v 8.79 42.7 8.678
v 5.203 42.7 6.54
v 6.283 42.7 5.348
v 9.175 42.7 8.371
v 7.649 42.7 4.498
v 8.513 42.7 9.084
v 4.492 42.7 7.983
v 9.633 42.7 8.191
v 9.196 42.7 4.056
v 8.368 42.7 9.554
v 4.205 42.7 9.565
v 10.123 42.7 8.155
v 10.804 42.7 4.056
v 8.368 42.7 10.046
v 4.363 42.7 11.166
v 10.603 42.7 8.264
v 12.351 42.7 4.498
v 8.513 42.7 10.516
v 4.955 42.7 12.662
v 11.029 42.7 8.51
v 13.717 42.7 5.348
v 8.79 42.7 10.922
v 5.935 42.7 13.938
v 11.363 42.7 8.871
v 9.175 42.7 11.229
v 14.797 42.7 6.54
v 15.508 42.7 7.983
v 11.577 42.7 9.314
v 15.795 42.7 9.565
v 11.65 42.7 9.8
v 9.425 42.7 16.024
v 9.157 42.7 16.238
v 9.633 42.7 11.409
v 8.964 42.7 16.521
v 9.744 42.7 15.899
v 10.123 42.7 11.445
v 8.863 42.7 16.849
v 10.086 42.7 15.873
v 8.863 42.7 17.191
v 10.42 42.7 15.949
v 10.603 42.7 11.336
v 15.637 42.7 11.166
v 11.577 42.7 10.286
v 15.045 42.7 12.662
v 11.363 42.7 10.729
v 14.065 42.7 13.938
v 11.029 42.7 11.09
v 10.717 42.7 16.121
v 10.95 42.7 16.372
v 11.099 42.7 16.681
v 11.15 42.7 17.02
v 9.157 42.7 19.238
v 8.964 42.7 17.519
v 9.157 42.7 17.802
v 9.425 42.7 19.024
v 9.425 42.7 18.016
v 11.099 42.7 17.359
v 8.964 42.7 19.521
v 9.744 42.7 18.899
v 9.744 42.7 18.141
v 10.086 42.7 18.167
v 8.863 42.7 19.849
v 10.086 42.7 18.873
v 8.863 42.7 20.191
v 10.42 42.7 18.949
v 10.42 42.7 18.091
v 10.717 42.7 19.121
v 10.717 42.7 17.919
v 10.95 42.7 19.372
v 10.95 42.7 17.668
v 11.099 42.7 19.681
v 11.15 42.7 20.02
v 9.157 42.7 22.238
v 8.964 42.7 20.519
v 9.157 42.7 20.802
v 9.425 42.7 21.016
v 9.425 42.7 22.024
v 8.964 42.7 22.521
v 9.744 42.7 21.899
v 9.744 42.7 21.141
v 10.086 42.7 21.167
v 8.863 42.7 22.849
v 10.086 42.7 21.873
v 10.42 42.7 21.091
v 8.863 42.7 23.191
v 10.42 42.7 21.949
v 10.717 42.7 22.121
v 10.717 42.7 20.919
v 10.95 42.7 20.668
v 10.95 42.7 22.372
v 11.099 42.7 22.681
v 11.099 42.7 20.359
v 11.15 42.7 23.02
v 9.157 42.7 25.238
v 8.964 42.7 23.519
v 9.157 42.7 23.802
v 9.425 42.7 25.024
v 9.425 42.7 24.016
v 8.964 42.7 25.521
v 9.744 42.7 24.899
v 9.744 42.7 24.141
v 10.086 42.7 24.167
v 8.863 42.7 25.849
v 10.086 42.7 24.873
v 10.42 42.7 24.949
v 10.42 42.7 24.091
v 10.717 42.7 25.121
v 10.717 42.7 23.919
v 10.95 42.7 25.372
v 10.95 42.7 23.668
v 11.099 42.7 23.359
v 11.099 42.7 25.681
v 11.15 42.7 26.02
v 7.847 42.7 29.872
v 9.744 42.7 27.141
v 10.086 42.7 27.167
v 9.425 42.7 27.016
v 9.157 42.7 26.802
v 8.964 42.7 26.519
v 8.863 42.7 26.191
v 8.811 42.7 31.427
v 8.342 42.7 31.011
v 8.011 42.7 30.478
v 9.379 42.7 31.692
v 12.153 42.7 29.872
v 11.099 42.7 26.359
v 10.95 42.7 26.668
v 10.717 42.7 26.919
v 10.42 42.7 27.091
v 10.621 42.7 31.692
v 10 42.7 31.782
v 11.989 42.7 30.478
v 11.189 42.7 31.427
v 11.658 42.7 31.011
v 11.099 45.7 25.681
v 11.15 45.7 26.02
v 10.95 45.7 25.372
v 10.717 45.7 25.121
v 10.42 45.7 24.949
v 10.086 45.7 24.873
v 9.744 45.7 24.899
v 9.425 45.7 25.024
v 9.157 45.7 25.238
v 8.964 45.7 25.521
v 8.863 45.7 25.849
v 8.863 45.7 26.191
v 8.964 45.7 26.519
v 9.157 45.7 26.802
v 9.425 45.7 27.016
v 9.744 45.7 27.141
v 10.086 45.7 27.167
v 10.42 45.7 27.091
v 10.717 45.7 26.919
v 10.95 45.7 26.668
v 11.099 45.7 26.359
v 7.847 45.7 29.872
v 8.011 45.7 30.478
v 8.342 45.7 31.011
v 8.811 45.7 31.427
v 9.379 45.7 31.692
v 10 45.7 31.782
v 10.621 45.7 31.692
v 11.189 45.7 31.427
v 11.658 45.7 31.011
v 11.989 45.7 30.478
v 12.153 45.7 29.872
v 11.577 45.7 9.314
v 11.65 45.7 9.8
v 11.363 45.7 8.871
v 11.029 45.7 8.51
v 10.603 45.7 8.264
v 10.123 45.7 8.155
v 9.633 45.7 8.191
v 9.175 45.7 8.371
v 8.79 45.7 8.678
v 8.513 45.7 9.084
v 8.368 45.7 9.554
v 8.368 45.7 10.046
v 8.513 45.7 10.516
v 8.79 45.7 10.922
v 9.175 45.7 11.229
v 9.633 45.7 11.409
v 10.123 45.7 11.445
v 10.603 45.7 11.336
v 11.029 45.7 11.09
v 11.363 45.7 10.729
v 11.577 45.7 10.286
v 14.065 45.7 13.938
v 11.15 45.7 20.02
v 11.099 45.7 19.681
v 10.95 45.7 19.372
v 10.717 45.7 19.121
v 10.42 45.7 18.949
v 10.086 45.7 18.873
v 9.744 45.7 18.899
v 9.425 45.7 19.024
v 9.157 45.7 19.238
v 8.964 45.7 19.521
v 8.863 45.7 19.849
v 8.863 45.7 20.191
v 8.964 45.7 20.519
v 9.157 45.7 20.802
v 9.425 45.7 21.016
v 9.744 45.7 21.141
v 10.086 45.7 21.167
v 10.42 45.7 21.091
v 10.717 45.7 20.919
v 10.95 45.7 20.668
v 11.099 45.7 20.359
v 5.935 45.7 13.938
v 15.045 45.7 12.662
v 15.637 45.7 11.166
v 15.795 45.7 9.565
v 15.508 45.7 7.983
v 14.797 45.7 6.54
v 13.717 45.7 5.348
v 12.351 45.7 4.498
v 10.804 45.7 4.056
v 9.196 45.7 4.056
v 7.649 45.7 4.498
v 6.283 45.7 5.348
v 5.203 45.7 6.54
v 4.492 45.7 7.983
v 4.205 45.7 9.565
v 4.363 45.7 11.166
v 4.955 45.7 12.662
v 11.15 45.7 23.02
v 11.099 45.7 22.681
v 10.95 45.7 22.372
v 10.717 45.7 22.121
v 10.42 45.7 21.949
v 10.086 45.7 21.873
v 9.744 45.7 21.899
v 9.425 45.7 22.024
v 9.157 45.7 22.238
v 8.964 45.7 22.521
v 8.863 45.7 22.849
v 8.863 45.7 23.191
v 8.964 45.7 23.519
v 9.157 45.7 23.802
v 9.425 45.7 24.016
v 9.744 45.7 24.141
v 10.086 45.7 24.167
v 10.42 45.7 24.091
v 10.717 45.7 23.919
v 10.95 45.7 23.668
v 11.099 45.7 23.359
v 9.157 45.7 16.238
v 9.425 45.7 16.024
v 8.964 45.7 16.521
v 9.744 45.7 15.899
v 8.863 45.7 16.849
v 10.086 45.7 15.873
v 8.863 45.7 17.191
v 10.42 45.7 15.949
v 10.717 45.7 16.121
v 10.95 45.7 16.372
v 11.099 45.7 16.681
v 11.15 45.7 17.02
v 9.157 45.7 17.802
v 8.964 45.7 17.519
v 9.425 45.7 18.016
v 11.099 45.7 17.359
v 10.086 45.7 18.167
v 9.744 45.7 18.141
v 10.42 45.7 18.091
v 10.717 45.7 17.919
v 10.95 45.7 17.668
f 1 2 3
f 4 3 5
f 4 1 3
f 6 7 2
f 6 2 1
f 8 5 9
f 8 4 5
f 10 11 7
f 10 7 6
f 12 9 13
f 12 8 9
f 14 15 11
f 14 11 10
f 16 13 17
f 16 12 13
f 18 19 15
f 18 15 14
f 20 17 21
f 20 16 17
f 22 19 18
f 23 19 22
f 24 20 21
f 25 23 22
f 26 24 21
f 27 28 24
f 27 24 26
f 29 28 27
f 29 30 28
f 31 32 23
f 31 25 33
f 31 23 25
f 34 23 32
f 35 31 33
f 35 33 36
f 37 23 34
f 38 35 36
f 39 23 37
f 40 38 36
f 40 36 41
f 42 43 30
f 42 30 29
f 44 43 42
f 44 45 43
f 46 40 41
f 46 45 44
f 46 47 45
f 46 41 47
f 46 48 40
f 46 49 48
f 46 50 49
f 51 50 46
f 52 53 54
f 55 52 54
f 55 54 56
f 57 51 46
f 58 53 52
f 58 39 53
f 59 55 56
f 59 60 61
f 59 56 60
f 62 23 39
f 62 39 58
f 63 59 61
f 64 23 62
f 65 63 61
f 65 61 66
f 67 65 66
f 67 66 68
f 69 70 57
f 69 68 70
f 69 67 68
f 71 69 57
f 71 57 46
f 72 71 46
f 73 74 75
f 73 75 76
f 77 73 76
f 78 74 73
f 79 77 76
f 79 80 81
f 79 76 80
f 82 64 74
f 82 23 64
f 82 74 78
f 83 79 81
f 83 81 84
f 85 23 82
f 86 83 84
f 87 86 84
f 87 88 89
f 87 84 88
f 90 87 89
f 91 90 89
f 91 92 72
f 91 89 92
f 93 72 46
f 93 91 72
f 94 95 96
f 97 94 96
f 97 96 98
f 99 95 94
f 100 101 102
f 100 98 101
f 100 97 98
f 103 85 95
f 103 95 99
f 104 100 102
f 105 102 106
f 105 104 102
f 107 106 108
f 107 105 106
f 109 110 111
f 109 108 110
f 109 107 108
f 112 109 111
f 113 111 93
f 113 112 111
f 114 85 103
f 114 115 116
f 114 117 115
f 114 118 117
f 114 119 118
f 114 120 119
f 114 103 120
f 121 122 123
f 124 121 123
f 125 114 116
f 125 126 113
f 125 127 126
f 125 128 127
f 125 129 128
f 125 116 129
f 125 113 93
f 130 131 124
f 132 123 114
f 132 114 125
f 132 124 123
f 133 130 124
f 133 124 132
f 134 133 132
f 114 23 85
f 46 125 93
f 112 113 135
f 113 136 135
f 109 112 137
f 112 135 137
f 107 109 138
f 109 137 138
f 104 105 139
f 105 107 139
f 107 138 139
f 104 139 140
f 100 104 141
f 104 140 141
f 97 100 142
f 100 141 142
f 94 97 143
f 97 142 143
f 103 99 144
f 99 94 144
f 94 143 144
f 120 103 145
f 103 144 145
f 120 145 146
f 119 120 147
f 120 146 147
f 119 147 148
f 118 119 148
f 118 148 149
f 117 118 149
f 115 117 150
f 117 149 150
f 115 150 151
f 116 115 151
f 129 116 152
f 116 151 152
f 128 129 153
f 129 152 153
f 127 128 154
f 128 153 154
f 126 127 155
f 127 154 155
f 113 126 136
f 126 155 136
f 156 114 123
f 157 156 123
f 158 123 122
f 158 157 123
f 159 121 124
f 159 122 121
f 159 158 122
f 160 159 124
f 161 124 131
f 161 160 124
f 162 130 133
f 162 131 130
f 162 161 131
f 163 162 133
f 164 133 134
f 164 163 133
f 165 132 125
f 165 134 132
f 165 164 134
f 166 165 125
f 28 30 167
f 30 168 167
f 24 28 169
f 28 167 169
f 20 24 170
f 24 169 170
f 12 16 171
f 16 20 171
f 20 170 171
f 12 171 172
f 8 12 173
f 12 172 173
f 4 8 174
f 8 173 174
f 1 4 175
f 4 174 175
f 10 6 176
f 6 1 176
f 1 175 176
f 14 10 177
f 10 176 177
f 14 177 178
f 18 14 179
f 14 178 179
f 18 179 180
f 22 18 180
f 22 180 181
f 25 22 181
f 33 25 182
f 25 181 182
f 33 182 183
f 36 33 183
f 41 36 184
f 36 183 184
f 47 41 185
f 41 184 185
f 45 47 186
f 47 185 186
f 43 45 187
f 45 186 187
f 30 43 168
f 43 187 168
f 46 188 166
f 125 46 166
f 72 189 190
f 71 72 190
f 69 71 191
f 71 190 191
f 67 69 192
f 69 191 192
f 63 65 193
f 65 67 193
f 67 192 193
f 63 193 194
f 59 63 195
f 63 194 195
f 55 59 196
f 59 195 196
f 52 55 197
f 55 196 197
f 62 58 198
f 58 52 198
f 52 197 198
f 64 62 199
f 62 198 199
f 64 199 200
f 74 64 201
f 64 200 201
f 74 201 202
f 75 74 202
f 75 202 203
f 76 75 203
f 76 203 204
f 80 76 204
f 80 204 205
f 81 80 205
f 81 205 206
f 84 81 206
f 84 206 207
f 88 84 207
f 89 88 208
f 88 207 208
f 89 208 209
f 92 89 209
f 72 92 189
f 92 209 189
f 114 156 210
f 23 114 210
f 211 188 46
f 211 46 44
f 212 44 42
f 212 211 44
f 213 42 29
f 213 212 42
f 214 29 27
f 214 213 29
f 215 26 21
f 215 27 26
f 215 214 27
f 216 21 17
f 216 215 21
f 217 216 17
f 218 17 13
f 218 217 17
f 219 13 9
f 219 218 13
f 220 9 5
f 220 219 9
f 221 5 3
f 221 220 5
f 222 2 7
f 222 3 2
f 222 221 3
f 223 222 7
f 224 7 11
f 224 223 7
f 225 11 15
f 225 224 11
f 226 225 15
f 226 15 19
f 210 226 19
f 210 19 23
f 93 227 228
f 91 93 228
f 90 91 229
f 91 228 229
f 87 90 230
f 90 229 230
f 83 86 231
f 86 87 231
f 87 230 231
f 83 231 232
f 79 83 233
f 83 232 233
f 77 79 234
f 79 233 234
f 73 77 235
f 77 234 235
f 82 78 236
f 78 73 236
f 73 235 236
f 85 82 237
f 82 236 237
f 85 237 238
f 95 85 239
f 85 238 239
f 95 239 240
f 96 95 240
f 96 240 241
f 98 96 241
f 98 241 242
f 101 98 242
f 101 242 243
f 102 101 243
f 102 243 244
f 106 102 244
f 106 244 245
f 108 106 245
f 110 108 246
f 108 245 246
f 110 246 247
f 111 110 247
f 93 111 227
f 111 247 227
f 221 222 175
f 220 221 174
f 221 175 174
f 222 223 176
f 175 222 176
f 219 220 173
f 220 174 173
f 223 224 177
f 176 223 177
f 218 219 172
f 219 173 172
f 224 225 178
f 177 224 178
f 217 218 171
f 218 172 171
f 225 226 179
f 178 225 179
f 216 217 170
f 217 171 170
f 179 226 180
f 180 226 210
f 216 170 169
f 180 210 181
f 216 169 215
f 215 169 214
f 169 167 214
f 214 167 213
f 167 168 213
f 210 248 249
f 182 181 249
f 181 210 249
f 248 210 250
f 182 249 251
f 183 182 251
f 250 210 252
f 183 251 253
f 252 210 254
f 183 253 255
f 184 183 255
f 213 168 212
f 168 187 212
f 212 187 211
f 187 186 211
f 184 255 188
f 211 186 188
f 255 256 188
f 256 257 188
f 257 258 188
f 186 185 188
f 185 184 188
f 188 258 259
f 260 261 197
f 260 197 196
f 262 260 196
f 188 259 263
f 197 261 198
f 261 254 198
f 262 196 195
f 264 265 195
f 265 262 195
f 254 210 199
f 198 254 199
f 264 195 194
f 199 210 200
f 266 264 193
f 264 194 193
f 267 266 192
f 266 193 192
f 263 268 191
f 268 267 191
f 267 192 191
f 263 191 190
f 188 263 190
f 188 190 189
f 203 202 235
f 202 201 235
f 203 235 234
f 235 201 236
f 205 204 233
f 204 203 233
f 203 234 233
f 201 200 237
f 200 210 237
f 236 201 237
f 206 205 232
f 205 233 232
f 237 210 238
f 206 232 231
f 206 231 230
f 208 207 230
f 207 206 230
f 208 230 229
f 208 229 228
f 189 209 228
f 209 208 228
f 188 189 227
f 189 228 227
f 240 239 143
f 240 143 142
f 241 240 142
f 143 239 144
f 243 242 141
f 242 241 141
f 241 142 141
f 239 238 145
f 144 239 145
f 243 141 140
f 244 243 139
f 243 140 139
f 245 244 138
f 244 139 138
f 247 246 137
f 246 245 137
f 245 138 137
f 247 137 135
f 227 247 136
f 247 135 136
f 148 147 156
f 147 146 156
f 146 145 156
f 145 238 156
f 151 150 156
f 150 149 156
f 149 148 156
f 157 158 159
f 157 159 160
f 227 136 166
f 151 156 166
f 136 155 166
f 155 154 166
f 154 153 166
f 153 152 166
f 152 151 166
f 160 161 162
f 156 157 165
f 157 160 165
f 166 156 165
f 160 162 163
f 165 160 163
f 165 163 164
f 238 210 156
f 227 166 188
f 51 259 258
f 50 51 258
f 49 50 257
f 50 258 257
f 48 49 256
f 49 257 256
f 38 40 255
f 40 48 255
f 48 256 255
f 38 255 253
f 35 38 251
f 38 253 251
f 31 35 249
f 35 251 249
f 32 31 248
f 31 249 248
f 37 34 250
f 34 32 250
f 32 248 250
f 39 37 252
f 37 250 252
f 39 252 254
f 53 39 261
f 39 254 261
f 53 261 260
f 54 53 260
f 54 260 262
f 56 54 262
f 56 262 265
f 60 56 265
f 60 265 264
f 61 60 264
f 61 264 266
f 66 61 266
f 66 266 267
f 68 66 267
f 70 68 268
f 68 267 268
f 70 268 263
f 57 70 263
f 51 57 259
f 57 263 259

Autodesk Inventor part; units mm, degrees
ref_plane "YZ Plane" through (0, 0, 0) normal (1, 0, 0) x (0, 1, 0)
ref_plane "XZ Plane" through (0, 0, 0) normal (0, 1, 0) x (-1, 0, 0)
ref_plane "XY Plane" through (0, 0, 0) normal (0, 0, 1) x (1, 0, 0)
ref_plane "Work Plane12" through (10, 45.7, 9.8) normal (0, -1, 0) x (1, 0, 0)
sketch "Sketch20" plane through (10, 45.7, 9.8) normal (0, -1, 0) x (1, 0, 0)
  circle A0 centre (0, 10.22) radius 1.15 projected
  circle A1 centre (0, 13.22) radius 1.15 projected
  circle A2 centre (0, 7.22) radius 1.15 projected
  circle A3 centre (0, 16.22) radius 1.15 projected
  arc A4 (2.55, 20.12) -> (-2.55, 20.12) centre (0, 19.8141) ccw projected
  line L0 (-2.55, 20.12) -> (-4.4453, 4.3219) projected
  arc A5 (-4.4453, 4.3219) -> (4.4453, 4.3219) centre (0, 0) ccw projected
  line L1 (4.4453, 4.3219) -> (2.55, 20.12) projected
  circle A6 centre (0, 0) radius 1.65 projected
  arc A7 (2.1528, 20.0724) -> (-2.1528, 20.0724) centre (0, 19.8141) ccw
  line L2 (-2.1528, 20.0724) -> (-4.0646, 4.1375)
  arc A8 (-4.0646, 4.1375) -> (4.0646, 4.1375) centre (0, 0) ccw
  line L3 (4.0646, 4.1375) -> (2.1528, 20.0724)
  point P0 (-10, -9.8)
  dimension "d95" = 0.4
extrude "Extrusion21" add sketch "Sketch20" along normal blind 3 contours L3 A8 L2 A7
properties part number "X4_leg_Servo_horn" material "Default New Material"
